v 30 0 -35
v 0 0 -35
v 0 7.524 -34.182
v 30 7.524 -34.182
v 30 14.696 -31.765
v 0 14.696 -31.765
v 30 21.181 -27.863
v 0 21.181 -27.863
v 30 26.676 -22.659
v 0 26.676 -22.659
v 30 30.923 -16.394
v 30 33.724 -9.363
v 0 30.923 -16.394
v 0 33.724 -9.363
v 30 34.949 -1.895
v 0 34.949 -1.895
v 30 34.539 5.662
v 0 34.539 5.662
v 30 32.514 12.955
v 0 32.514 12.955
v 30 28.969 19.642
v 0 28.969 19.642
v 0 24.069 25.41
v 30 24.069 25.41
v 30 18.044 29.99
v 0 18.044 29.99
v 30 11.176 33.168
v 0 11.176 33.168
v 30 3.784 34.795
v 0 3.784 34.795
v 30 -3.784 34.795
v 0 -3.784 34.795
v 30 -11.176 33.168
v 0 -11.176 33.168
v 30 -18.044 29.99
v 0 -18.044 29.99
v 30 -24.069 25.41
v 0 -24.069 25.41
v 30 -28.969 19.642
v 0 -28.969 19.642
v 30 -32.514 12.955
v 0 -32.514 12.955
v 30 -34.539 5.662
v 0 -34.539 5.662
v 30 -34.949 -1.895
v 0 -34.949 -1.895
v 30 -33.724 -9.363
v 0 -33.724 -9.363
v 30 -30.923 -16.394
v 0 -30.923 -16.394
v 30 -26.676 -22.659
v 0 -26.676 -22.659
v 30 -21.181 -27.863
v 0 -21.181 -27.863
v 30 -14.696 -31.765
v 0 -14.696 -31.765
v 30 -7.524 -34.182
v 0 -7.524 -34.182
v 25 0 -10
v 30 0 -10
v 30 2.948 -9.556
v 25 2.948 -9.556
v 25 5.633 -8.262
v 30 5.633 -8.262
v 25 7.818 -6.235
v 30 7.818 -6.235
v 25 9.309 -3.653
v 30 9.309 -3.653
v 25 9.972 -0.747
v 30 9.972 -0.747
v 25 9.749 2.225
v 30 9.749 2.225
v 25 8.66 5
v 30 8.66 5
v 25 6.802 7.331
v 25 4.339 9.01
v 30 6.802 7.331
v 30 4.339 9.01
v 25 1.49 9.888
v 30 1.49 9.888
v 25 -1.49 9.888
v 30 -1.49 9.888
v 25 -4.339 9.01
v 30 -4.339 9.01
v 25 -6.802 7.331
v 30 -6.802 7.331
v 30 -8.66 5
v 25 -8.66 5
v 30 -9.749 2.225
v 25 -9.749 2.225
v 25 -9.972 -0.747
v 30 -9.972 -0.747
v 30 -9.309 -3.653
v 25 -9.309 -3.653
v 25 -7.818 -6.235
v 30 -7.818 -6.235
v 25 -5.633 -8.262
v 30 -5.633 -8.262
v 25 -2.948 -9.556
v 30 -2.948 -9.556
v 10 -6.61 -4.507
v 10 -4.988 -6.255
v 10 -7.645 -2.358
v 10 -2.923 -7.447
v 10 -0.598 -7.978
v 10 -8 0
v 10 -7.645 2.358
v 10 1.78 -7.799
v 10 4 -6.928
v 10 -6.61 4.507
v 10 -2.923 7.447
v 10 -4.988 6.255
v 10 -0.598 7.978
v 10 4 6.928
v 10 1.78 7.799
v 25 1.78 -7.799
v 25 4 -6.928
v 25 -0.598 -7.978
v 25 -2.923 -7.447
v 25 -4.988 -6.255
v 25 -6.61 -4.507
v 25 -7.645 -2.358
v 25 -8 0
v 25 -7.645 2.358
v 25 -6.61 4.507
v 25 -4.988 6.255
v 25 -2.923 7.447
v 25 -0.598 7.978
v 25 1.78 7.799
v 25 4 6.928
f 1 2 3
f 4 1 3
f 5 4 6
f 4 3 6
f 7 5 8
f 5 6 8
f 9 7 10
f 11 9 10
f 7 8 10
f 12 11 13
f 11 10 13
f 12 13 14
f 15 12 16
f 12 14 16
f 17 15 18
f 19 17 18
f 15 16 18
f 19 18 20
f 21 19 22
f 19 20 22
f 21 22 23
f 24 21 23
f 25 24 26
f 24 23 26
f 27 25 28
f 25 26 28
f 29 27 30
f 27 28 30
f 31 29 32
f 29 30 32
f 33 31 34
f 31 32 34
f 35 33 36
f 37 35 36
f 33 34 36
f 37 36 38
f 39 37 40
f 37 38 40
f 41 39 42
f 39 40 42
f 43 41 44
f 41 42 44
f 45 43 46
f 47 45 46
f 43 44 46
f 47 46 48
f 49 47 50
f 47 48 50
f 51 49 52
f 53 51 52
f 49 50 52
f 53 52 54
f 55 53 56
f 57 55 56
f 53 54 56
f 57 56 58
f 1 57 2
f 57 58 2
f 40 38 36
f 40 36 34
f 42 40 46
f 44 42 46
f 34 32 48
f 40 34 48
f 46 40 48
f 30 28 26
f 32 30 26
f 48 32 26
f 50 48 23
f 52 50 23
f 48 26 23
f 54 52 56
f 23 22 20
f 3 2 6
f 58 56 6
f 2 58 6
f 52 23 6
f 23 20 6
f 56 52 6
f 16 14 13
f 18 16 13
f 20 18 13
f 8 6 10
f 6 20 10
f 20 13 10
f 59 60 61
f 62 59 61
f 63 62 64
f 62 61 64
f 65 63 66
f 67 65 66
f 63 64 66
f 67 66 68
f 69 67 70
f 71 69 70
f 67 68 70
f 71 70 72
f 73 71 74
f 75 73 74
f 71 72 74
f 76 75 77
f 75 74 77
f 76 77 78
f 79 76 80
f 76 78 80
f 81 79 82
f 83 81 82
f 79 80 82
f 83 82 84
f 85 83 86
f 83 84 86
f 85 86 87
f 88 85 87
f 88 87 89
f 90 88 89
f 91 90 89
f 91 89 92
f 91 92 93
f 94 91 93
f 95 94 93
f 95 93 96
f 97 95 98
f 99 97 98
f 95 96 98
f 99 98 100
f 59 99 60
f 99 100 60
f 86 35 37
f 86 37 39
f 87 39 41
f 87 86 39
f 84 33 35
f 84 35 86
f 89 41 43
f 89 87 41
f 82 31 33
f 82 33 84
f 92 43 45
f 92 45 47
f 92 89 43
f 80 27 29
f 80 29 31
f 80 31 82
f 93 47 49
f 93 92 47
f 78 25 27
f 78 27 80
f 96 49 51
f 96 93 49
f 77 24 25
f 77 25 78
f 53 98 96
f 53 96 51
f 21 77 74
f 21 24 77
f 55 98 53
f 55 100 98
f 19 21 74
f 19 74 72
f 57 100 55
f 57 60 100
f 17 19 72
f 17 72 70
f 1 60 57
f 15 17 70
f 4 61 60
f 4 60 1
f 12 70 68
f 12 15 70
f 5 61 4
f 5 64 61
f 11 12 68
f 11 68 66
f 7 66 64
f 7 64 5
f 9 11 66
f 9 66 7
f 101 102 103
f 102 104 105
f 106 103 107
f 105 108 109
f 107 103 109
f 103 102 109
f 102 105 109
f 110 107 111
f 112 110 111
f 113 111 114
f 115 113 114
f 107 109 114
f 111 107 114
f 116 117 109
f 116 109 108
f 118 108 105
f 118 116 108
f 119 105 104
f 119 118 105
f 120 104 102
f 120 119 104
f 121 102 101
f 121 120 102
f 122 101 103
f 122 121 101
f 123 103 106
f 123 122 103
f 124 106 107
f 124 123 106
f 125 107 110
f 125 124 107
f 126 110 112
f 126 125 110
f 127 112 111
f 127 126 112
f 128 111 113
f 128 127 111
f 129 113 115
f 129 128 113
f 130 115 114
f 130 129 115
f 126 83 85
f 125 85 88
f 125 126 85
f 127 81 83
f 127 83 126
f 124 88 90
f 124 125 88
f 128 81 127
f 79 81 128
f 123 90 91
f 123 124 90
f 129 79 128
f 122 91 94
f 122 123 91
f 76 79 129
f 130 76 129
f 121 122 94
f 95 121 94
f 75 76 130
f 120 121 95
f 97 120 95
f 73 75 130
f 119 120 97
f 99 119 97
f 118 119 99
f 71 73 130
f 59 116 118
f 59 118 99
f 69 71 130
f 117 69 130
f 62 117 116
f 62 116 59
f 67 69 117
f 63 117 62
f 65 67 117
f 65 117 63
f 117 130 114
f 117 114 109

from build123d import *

# Parameters (mm, degrees)
SKETCH1_R           = 35
BOSS_EXTRUDE1_DEPTH = 30
SKETCH2_R           = 10
CUT_EXTRUDE1_DEPTH  = 5
CUT_EXTRUDE2_DEPTH  = 15


with BuildPart() as part:
    # Sketch1 → Boss-Extrude1 (new body)
    with BuildSketch(Plane(origin=(0, 0, 0), x_dir=(0, 0, -1), z_dir=(1, 0, 0))):
        Circle(SKETCH1_R)
    extrude(amount=BOSS_EXTRUDE1_DEPTH)

    # Sketch2 → Cut-Extrude1 (cut)
    with BuildSketch(Plane(origin=(30, 0, 0), x_dir=(0, 0, -1), z_dir=(1, 0, 0))):
        Circle(SKETCH2_R)
    extrude(amount=-CUT_EXTRUDE1_DEPTH, mode=Mode.SUBTRACT)

    # Sketch3 → Cut-Extrude2 (cut)
    with BuildSketch(Plane(origin=(25, 0, 0), x_dir=(0, 0, -1), z_dir=(1, 0, 0))):
        with BuildLine():
            Line((-6.92820323, 4), (6.92820323, 4))
            ThreePointArc((6.92820323, 4), (0, -8), (-6.92820323, 4))
        make_face()
    extrude(amount=-CUT_EXTRUDE2_DEPTH, mode=Mode.SUBTRACT)


solid = part.part
